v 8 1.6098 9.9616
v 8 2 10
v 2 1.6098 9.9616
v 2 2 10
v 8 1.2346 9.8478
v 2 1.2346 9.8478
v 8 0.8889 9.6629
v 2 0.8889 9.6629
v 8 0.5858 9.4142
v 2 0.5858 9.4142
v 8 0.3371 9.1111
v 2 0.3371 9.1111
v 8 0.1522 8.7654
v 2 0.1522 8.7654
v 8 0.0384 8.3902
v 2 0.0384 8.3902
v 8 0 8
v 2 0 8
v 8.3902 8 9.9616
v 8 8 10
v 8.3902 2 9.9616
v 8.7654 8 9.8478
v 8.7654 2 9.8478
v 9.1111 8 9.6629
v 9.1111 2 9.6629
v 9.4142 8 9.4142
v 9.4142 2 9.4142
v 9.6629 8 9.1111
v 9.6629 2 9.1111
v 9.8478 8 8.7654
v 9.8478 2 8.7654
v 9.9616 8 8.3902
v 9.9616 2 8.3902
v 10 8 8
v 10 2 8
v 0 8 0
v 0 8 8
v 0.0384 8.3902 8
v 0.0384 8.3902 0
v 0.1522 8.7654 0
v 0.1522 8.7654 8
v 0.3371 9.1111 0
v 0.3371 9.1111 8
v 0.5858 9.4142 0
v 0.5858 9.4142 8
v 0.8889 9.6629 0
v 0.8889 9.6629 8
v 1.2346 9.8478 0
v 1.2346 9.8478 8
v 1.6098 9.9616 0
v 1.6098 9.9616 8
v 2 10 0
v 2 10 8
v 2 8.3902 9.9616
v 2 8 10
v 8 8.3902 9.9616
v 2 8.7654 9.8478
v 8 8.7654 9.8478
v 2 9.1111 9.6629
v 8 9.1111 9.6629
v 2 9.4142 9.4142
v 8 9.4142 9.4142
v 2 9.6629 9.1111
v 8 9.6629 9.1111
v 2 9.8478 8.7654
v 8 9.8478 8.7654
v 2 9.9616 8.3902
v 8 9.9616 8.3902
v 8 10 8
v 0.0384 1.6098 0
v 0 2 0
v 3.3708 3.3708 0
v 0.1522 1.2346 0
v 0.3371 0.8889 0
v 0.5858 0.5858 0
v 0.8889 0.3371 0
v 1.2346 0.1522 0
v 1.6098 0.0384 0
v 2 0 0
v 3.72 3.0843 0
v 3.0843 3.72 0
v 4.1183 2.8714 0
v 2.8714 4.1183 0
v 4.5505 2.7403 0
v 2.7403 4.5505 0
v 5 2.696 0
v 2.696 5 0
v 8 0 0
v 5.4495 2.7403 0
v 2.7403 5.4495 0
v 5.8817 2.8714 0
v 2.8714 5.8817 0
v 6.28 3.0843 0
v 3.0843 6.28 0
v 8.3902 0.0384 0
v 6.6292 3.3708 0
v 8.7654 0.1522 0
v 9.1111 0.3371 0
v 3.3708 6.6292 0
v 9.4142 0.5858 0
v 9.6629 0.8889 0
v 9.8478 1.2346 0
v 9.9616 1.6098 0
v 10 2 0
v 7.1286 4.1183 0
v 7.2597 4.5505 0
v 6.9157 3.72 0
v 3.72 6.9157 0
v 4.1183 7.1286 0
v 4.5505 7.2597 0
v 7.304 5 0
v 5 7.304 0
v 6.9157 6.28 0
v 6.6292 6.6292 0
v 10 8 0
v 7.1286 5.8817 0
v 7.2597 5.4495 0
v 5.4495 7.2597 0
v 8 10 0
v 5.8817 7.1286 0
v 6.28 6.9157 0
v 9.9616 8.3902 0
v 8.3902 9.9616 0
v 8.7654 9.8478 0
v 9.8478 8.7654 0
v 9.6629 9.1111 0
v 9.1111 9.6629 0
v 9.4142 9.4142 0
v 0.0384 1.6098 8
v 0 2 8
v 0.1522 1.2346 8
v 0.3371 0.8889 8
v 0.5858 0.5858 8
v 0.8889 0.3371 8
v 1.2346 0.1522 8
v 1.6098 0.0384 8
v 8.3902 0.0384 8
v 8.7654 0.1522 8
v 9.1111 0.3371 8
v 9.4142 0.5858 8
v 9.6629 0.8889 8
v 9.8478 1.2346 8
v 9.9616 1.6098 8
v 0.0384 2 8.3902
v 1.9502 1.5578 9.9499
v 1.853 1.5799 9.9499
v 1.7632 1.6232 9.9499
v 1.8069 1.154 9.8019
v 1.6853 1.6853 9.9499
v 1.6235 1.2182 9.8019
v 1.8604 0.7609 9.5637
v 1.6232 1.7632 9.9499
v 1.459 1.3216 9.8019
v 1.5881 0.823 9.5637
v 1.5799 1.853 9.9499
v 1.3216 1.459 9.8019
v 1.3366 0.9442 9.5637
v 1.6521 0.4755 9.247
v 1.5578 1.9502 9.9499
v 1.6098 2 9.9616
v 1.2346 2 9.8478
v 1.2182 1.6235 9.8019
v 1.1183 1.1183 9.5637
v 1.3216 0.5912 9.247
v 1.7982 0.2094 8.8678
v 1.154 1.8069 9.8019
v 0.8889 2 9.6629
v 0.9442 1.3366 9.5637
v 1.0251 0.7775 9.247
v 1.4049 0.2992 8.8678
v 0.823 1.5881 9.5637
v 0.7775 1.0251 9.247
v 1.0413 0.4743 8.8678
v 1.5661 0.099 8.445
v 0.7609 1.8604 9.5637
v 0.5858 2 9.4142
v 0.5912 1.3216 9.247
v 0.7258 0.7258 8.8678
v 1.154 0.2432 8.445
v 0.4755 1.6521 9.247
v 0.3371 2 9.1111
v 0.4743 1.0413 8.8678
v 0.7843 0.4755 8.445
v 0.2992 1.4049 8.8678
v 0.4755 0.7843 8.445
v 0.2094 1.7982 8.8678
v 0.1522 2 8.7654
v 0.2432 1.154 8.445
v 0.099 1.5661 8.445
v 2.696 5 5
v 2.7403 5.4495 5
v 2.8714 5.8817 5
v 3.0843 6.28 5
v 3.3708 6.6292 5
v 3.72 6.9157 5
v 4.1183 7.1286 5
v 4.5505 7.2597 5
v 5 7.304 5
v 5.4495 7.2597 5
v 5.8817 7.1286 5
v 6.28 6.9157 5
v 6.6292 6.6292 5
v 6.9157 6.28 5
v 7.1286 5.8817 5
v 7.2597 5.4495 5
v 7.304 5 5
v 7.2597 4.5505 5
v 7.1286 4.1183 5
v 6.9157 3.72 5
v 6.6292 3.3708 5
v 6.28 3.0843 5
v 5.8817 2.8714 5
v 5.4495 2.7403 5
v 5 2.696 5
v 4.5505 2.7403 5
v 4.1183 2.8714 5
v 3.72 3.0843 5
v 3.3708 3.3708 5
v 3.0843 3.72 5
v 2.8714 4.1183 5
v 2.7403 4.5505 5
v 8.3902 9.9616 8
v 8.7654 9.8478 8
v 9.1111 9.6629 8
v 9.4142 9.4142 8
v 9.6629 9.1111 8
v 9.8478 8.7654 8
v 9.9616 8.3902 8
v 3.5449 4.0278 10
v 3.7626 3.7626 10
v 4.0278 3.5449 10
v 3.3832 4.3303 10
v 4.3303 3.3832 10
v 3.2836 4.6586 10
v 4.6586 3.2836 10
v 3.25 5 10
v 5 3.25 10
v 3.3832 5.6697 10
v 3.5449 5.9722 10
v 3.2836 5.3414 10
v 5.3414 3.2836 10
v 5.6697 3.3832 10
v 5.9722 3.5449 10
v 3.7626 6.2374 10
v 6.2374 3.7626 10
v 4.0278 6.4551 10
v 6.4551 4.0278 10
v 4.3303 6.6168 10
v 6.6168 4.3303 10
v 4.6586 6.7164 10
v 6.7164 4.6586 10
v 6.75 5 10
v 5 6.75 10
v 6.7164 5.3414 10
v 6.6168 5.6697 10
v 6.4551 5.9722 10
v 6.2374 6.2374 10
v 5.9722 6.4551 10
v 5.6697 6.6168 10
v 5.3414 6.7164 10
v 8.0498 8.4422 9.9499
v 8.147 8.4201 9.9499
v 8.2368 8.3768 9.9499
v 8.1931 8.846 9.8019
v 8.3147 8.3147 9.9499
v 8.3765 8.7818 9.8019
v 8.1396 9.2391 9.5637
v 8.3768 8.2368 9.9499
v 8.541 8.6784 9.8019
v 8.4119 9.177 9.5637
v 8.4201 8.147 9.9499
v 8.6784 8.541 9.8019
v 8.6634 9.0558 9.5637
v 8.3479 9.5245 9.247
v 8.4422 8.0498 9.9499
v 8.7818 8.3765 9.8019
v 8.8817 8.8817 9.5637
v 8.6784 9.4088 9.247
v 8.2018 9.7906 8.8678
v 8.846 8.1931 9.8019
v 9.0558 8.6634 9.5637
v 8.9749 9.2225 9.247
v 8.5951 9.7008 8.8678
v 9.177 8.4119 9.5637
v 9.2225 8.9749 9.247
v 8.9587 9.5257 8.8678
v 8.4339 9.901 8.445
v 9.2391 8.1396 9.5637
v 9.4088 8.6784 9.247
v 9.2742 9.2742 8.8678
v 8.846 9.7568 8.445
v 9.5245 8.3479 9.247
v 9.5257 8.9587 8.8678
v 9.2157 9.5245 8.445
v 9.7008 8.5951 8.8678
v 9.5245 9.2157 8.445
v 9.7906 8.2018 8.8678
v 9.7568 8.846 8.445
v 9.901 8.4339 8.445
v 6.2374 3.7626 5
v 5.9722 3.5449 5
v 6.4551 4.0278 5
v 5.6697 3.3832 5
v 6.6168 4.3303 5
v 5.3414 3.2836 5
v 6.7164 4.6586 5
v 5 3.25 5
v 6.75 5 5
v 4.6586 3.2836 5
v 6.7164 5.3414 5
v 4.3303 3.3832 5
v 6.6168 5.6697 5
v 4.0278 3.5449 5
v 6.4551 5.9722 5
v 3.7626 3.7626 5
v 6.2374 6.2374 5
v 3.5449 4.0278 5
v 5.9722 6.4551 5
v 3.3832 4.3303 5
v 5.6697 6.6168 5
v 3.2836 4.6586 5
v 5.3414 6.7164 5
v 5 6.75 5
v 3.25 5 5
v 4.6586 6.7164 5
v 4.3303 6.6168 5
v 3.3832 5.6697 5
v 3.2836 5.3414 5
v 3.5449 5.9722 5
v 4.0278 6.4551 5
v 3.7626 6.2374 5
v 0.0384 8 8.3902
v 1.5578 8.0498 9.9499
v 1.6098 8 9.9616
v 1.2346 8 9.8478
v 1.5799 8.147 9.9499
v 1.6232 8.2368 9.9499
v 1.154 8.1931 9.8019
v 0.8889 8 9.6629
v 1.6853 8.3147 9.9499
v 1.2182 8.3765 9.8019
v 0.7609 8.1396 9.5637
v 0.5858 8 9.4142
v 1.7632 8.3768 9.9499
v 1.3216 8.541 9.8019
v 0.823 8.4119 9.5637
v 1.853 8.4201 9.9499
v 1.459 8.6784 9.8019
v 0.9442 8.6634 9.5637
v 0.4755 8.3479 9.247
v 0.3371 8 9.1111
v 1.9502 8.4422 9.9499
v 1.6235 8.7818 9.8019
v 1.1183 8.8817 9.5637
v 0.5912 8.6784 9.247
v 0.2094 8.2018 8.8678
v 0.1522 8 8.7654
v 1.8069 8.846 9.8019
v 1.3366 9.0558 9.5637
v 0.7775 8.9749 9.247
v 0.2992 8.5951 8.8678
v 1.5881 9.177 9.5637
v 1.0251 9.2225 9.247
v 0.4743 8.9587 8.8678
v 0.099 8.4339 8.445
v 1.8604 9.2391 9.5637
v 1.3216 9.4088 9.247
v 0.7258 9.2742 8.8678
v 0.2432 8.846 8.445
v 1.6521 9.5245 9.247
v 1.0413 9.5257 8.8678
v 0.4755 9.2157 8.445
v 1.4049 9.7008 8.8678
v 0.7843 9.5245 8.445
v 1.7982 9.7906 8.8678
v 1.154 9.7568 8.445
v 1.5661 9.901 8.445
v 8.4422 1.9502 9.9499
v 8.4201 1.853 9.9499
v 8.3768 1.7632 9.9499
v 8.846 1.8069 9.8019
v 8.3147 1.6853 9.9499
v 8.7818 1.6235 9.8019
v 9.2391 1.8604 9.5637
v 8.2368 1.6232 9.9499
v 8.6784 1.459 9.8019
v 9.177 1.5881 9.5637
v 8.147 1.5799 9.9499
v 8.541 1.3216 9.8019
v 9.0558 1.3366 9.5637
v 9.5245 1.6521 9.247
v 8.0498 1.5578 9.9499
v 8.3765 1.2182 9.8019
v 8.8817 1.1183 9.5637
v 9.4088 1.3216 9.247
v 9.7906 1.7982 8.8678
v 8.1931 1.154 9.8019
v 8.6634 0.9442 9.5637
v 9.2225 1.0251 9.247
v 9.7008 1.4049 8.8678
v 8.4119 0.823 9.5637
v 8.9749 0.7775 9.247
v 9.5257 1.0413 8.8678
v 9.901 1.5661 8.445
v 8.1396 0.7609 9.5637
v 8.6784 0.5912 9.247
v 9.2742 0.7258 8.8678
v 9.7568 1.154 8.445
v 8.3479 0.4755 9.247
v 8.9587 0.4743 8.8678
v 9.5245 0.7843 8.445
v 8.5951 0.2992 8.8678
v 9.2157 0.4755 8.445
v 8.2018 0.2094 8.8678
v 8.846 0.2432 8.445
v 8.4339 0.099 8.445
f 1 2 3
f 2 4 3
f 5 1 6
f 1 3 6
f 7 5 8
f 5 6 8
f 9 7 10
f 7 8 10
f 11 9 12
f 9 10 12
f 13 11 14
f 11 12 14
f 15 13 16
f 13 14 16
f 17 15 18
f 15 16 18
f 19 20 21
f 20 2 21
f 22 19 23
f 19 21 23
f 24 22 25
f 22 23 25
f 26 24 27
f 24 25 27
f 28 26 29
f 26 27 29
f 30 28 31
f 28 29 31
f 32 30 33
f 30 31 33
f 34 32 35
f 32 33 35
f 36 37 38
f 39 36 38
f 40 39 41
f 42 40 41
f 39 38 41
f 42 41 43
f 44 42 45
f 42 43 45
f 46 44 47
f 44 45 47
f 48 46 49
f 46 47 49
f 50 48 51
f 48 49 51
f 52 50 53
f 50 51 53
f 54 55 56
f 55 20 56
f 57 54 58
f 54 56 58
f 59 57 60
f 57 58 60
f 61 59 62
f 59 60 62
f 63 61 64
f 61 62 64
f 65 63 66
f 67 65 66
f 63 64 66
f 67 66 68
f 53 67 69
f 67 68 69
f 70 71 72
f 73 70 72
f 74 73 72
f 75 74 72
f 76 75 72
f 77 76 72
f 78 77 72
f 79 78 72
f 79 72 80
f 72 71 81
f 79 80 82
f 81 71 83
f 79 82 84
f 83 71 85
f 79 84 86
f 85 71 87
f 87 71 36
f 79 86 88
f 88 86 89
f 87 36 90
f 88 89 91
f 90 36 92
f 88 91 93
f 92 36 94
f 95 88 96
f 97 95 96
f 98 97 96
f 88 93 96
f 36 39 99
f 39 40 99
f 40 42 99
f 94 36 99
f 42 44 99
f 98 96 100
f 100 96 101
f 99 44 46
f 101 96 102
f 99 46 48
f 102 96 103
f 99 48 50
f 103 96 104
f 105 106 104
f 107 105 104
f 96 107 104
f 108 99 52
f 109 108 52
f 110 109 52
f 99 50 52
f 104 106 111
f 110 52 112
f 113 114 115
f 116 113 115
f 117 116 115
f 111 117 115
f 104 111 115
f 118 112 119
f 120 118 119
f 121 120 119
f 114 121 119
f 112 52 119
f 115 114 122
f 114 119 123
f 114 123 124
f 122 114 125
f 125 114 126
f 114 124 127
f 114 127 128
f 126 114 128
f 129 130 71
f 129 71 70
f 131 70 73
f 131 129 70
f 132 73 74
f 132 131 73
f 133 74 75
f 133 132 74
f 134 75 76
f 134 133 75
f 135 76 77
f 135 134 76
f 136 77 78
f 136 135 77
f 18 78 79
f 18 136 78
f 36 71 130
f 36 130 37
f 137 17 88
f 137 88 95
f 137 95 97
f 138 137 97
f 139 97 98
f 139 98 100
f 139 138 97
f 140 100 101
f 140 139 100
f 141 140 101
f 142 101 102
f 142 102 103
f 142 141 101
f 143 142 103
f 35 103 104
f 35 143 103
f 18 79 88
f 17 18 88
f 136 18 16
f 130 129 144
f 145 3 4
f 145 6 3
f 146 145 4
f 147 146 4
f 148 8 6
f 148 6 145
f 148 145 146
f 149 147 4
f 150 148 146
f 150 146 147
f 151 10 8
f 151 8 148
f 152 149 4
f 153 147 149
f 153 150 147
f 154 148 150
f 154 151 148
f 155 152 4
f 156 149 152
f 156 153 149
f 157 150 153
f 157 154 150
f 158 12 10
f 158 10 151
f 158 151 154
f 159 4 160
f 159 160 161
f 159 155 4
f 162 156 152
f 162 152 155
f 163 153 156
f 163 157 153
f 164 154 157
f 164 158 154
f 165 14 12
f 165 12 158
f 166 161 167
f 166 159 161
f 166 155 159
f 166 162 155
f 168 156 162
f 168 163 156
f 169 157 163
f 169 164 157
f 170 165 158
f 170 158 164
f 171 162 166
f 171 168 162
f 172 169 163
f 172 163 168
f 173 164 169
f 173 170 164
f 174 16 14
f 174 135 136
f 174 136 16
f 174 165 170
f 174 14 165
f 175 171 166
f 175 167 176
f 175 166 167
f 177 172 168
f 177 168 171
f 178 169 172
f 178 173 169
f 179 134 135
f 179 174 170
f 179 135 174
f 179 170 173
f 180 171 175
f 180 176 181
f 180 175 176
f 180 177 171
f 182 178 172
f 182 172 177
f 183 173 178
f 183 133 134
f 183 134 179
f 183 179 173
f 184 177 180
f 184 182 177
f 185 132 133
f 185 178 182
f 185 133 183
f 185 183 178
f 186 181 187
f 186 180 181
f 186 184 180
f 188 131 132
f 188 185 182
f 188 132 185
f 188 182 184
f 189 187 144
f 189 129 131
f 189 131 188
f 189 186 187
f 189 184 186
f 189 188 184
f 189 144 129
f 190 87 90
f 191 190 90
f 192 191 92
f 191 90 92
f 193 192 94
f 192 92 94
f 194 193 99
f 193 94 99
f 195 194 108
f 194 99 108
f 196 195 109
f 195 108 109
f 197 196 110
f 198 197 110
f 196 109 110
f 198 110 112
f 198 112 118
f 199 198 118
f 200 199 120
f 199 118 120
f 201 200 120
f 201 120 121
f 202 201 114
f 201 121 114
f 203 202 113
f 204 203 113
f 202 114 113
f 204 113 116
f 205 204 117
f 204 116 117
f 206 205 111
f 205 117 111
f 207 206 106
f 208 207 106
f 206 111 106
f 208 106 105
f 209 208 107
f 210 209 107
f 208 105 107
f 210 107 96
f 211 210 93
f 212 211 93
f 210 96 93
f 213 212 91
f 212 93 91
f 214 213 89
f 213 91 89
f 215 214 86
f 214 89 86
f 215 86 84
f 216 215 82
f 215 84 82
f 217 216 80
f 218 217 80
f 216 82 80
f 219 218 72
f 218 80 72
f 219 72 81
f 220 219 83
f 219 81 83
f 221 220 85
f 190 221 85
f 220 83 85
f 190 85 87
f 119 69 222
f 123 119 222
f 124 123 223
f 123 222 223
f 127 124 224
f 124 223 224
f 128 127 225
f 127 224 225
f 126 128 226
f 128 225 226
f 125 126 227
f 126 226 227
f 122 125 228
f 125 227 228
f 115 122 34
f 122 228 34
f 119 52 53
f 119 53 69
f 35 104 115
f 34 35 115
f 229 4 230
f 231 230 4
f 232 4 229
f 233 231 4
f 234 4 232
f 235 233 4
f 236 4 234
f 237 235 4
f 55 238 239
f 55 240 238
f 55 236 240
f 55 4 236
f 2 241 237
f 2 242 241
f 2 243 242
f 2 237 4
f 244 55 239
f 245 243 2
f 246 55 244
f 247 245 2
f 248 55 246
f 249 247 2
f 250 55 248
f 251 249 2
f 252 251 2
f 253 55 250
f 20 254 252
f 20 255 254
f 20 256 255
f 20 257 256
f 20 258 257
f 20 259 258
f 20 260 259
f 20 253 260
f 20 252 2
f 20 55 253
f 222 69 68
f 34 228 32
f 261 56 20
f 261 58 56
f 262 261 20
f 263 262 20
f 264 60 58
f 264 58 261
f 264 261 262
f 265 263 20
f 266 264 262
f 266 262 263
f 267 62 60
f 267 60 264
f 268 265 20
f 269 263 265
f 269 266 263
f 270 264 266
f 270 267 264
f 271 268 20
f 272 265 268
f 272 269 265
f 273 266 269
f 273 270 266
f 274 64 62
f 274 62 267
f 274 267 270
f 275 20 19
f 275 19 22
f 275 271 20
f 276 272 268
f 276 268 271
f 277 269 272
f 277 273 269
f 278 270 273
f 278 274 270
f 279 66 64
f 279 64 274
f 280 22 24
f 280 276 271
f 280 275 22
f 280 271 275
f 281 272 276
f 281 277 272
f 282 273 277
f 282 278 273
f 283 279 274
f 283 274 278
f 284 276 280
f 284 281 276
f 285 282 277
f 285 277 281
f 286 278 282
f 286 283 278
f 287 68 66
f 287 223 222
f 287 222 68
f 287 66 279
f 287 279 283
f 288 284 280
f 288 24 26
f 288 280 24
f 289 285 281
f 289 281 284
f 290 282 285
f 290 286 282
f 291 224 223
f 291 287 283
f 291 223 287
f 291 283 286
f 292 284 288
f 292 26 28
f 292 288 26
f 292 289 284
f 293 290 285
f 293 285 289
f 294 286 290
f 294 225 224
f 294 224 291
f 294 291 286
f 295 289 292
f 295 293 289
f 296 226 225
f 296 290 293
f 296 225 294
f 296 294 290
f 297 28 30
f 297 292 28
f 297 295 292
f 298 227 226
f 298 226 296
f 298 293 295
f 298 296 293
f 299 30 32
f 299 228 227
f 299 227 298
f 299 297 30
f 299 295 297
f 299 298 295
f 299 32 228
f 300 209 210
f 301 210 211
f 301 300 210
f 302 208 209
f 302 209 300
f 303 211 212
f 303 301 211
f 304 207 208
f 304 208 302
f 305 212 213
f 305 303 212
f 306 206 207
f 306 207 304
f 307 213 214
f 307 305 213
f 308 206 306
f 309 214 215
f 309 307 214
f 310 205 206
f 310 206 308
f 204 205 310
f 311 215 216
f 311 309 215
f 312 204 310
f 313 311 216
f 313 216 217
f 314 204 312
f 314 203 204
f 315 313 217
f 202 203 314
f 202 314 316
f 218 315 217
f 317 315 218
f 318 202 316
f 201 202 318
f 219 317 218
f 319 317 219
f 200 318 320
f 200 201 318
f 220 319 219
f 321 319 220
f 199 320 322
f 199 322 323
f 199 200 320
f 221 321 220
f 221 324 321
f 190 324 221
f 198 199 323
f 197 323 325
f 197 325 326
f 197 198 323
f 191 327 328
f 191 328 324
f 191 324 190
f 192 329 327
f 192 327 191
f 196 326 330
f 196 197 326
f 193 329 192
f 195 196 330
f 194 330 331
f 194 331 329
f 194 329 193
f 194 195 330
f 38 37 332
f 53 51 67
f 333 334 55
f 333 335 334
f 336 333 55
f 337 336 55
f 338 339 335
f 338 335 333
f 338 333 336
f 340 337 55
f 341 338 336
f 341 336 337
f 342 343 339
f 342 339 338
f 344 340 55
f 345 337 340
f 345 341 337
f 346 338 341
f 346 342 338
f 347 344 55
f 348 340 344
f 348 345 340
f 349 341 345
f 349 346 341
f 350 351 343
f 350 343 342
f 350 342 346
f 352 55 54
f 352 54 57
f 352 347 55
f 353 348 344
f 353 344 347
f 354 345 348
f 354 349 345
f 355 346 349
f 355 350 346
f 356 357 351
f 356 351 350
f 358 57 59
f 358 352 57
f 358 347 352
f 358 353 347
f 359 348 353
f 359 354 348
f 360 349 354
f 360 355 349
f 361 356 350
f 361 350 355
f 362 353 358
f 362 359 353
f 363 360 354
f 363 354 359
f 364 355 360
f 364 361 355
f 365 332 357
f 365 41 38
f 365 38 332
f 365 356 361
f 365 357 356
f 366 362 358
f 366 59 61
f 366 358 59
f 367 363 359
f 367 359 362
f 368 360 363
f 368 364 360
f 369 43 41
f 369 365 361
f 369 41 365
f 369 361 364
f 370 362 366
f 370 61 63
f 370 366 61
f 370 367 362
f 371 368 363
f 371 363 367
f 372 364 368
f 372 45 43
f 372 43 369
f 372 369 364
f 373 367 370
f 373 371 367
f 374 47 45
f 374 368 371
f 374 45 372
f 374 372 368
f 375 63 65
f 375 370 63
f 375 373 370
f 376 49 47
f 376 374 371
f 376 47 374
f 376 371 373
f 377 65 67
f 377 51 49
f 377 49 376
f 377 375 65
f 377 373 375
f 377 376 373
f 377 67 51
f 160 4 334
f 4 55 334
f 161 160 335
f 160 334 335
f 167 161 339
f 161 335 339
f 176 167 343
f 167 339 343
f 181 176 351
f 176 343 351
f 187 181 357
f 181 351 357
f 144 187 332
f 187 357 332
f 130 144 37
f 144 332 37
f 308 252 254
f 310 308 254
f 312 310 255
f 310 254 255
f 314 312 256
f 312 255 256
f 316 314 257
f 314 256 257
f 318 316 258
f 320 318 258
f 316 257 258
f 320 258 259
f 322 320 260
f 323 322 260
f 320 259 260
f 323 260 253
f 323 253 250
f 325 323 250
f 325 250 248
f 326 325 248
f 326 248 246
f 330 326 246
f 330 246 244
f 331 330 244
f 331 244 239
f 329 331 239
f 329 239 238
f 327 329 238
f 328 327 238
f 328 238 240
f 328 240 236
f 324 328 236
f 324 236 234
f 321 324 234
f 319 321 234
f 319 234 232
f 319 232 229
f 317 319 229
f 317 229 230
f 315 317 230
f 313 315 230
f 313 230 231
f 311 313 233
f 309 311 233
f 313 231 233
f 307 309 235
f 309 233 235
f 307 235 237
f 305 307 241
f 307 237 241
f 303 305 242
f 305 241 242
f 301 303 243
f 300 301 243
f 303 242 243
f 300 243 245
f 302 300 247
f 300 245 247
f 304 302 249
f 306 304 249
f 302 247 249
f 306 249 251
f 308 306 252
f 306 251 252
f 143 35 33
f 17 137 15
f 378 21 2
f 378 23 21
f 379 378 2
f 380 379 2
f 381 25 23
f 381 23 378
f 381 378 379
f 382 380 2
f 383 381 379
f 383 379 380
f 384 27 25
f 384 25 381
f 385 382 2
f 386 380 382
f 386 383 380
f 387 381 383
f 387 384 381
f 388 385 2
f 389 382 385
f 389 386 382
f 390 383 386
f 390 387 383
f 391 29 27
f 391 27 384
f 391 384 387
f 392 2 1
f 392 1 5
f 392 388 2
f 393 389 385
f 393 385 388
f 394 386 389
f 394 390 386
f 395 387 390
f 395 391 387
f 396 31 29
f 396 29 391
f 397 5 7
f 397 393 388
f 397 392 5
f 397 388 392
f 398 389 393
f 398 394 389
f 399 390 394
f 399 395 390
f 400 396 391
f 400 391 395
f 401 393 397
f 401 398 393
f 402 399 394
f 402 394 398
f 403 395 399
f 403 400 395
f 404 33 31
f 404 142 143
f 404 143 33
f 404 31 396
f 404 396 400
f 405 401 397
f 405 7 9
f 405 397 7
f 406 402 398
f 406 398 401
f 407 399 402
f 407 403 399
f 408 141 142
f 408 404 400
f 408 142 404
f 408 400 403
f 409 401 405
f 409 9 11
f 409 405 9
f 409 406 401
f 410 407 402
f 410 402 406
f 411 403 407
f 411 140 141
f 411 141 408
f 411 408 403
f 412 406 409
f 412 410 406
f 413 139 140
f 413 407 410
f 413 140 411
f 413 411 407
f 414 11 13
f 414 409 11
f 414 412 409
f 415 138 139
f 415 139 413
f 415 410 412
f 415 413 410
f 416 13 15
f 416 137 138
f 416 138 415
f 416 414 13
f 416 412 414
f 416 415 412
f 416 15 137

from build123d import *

# Parameters (mm, degrees)
SKETCH1_W           = 10
SKETCH1_H           = 10
BOSS_EXTRUDE1_DEPTH = 10
SKETCH2_R           = 1.75
CUT_EXTRUDE1_DEPTH  = 11
SKETCH3_R           = 2.304
CUT_EXTRUDE2_DEPTH  = 5
FILLET1_R           = 2
FILLET2_R           = 2


with BuildPart() as part:
    # Sketch1 → Boss-Extrude1 (new body)
    with BuildSketch(Plane.XY):
        with Locations((5, 5)):
            Rectangle(SKETCH1_W, SKETCH1_H)
    extrude(amount=BOSS_EXTRUDE1_DEPTH)

    # Sketch2 → Cut-Extrude1 (cut, through all)
    with BuildSketch(Plane.XY.offset(10)):
        with Locations((5, 5)):
            Circle(SKETCH2_R)
    extrude(amount=-CUT_EXTRUDE1_DEPTH, mode=Mode.SUBTRACT)

    # Sketch3 → Cut-Extrude2 (cut)
    with BuildSketch(Plane(origin=(0, 0, 0), x_dir=(-1, 0, 0), z_dir=(0, 0, -1))):
        with Locations((-5, 5)):
            Circle(SKETCH3_R)
    extrude(amount=-CUT_EXTRUDE2_DEPTH, mode=Mode.SUBTRACT)

    # Fillet1
    fillet1_edges = [part.edges().sort_by_distance(p)[0] for p in [
        (0, 10, 5),
        (10, 10, 5),
        (10, 0, 5),
        (0, 0, 5),
    ]]
    fillet(fillet1_edges, radius=FILLET1_R)

    # Fillet2
    fillet2_edges = [part.edges().sort_by_distance(p)[0] for p in [
        (5, 10, 10),
        (10, 5, 10),
        (0, 5, 10),
        (5, 0, 10),
        (9.414213562, 0.585786438, 10),
        (0.585786438, 0.585786438, 10),
        (0.585786438, 9.414213562, 10),
        (9.414213562, 9.414213562, 10),
    ]]
    fillet(fillet2_edges, radius=FILLET2_R)


solid = part.part
